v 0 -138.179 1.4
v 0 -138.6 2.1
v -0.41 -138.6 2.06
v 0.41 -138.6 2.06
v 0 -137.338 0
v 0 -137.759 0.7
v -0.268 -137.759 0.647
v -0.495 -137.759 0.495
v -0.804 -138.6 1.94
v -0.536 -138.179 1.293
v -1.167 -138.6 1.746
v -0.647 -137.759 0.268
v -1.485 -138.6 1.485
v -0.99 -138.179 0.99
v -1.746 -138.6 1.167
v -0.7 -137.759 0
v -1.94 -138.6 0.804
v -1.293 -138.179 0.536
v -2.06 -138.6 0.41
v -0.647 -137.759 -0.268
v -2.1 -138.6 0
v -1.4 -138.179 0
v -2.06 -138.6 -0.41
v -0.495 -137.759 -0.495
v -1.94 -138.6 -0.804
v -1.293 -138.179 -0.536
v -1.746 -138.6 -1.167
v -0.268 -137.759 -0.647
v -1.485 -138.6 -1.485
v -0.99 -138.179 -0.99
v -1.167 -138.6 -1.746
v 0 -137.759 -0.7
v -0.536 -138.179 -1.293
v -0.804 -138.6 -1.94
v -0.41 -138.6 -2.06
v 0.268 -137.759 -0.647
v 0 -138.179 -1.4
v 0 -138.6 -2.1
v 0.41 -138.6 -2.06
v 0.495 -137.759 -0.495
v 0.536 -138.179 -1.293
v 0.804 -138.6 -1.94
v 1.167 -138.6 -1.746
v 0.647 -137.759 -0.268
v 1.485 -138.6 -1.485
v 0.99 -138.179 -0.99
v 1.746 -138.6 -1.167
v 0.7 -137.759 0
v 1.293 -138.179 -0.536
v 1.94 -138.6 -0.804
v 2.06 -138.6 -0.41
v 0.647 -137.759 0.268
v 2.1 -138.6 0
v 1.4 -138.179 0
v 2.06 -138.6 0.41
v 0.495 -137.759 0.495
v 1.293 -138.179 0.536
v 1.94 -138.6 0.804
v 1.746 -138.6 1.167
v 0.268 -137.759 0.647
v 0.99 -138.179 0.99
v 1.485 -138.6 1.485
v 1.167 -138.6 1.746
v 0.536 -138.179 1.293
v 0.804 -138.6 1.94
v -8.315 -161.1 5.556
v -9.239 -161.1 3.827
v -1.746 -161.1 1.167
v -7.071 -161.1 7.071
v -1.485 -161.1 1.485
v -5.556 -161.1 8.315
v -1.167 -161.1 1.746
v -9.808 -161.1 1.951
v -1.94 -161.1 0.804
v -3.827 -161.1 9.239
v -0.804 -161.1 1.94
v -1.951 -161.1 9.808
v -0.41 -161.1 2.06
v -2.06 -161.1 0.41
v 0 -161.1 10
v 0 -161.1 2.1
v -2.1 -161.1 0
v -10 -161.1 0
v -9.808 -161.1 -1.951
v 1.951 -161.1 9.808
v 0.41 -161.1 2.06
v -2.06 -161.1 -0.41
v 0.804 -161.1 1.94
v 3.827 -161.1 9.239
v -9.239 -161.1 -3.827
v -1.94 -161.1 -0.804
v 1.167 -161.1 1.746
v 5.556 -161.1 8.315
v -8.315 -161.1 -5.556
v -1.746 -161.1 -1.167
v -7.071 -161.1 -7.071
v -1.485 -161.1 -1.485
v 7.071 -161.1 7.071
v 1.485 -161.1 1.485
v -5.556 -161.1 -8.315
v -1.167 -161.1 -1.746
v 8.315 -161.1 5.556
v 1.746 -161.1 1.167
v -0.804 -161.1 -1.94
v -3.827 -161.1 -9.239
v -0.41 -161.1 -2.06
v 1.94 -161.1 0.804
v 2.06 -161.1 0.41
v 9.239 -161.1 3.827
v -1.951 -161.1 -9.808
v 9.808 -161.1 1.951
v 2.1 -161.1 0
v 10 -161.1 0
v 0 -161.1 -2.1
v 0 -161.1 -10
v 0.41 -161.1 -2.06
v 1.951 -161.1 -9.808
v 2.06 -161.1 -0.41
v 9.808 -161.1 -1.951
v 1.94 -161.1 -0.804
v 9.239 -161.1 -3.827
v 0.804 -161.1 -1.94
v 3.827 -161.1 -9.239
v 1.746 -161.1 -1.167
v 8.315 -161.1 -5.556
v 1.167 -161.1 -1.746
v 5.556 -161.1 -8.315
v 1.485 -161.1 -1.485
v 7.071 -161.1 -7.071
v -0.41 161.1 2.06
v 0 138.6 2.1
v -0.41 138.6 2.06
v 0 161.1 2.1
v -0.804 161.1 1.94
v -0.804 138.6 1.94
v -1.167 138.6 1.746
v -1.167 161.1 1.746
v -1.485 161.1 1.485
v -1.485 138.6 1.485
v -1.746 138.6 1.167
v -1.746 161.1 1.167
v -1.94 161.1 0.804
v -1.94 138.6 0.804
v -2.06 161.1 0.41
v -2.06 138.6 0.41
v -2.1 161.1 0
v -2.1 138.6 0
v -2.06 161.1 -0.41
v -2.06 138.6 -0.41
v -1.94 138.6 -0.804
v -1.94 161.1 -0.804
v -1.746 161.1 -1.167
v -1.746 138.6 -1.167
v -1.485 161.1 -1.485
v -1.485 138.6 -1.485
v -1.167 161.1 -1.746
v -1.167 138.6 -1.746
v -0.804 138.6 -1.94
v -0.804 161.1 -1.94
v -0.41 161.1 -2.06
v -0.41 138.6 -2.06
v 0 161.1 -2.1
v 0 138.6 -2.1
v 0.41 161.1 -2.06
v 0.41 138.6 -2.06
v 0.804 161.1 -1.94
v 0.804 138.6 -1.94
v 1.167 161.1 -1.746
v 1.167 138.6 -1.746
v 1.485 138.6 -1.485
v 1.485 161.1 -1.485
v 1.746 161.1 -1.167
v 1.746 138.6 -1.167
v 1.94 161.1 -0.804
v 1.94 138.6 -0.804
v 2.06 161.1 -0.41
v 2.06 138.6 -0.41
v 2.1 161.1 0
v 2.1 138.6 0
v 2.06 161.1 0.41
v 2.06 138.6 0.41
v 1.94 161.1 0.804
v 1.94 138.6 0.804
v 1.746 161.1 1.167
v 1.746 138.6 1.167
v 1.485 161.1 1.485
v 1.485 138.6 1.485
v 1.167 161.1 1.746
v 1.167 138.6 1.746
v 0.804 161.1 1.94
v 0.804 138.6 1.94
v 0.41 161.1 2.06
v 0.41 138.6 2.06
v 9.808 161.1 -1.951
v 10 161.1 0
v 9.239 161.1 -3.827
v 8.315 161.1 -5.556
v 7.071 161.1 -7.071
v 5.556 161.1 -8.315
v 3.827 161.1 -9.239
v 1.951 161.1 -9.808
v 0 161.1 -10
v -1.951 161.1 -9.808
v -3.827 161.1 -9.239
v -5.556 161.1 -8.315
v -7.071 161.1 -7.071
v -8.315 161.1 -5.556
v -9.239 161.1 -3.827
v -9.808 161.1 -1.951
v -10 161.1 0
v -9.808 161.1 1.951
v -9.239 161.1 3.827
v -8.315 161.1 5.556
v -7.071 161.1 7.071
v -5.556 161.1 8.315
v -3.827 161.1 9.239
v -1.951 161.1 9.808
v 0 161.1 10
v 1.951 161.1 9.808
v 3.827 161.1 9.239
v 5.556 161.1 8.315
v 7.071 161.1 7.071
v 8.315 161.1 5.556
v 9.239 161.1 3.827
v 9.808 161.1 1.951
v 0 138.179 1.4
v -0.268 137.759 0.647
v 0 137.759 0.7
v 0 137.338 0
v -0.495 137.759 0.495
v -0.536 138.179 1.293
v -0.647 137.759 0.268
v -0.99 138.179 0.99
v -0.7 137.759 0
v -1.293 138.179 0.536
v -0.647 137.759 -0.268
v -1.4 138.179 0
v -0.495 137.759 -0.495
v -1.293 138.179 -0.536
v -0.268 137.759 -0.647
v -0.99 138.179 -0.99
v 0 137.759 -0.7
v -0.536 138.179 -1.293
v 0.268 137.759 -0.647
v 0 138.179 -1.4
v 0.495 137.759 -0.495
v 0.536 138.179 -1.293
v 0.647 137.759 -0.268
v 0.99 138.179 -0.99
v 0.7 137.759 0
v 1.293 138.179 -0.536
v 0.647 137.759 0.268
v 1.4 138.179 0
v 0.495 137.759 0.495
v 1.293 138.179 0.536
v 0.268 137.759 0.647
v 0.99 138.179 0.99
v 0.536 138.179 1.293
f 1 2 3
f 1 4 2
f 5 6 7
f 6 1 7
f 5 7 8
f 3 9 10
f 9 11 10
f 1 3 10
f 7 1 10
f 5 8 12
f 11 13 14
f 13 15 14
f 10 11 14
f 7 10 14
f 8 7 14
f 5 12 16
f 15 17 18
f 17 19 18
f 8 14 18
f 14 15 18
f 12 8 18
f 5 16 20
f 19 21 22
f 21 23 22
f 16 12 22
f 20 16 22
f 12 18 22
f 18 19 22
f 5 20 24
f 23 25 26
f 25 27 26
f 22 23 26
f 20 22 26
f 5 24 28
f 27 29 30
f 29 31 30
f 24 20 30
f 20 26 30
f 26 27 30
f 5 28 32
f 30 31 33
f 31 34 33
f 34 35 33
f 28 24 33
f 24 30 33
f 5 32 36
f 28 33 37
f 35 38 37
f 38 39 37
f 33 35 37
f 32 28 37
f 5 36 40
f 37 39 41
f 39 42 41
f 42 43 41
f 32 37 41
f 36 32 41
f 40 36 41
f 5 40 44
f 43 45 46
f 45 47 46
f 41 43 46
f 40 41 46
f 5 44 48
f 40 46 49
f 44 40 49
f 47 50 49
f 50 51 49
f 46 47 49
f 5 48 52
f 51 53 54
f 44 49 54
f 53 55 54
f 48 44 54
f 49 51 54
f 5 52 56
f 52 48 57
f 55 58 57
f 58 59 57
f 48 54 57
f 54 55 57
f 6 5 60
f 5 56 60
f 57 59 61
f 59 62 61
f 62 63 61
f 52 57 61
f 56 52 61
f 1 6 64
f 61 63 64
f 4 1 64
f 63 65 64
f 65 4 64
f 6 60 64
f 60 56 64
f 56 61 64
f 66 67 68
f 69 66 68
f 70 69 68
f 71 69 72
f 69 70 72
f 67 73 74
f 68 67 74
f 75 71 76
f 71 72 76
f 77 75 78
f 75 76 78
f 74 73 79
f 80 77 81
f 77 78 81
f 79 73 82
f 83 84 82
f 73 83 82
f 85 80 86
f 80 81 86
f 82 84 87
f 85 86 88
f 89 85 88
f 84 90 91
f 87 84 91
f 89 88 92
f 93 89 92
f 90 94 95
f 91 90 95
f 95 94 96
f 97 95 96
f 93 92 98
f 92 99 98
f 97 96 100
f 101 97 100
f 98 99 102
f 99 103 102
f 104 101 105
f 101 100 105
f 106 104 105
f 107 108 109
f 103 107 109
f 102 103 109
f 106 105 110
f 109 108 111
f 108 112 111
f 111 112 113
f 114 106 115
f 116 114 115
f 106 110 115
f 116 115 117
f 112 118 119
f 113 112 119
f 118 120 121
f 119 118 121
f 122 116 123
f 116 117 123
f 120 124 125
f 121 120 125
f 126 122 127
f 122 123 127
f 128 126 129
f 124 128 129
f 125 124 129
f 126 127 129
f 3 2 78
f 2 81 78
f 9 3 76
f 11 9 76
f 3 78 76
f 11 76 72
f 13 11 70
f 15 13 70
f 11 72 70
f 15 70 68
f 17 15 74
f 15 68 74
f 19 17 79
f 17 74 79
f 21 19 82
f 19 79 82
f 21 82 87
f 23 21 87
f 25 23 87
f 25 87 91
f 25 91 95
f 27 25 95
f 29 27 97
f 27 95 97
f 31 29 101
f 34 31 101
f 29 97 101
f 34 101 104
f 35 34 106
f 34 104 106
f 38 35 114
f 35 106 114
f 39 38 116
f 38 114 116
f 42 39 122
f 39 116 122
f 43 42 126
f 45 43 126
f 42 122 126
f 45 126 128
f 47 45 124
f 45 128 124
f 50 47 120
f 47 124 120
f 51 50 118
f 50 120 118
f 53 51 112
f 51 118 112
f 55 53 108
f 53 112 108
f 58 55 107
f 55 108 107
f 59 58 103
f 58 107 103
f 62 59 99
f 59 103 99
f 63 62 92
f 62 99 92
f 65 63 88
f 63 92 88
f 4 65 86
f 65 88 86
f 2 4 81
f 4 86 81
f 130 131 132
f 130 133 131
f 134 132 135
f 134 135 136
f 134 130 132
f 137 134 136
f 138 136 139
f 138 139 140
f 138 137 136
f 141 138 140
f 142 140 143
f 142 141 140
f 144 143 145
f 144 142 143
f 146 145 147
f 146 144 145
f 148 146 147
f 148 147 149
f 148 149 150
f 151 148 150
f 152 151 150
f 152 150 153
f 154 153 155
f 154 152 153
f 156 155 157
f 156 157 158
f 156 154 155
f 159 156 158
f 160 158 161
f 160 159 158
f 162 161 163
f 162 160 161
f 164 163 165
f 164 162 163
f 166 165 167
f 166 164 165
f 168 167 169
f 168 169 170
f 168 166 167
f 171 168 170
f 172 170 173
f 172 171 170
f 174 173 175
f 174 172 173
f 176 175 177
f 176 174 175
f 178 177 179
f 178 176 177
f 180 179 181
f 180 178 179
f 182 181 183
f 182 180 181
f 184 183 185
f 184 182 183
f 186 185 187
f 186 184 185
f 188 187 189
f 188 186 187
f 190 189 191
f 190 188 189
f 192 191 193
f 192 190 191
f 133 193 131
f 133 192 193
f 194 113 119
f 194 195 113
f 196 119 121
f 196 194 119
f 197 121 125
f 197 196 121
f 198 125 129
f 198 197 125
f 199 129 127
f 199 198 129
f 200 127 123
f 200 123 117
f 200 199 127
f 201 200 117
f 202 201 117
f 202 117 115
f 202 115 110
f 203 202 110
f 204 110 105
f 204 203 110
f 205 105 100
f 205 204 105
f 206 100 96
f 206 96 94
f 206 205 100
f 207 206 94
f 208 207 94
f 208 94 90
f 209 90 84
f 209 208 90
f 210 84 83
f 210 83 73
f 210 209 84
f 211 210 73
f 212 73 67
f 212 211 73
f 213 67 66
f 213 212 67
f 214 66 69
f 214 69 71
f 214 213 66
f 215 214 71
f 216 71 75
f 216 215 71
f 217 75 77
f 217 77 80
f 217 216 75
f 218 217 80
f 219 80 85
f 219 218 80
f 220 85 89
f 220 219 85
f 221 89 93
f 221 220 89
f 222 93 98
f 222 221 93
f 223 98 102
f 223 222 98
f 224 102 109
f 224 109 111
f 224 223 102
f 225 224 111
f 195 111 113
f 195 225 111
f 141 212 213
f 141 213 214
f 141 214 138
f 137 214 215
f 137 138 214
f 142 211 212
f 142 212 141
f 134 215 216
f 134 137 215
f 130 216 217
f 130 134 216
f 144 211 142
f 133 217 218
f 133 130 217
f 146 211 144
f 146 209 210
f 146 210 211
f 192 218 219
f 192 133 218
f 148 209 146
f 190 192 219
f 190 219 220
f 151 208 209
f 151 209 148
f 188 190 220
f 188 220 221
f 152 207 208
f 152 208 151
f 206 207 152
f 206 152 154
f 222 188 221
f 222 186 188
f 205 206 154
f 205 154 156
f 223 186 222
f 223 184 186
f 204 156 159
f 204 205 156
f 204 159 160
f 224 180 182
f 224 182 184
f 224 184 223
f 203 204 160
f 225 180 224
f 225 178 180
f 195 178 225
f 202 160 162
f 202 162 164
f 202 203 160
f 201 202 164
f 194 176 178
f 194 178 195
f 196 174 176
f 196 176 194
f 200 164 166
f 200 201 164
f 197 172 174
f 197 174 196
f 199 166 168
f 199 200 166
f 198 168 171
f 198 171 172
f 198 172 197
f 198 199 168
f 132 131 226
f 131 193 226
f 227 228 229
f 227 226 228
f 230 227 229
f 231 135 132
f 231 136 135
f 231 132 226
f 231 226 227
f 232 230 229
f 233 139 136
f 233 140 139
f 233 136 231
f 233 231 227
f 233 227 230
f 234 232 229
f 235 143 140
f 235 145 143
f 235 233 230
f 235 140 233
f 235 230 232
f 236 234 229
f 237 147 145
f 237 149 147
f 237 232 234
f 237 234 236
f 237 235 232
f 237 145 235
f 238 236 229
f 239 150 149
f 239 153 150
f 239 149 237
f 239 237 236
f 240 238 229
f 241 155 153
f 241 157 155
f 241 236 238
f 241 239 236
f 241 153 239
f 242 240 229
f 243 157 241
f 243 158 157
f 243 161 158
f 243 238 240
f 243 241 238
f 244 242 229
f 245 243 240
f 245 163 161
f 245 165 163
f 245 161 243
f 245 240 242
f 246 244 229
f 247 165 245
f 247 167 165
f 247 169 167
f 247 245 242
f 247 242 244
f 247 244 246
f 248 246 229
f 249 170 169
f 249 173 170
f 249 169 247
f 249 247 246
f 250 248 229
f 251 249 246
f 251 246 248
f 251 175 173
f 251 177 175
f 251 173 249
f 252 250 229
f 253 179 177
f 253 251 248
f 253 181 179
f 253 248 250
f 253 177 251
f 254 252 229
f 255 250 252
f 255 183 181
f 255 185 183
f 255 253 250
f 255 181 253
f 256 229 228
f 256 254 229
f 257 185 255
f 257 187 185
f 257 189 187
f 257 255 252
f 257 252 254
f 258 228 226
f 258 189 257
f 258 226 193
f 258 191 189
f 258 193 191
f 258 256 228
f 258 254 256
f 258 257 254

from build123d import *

# Parameters (mm, degrees)
SKETCH1_R           = 10
BOSS_EXTRUDE1_DEPTH = 161.1


with BuildPart() as part:
    # Sketch1 → Boss-Extrude1 (new body, symmetric)
    with BuildSketch(Plane(origin=(0, 0, 0), x_dir=(1, 0, 0), z_dir=(0, 1, 0))):
        Circle(SKETCH1_R)
    extrude(amount=BOSS_EXTRUDE1_DEPTH, both=True)

    # Sketch3 → M5x0.8 Tapped Hole1 (revolve, cut)
    with BuildSketch(Plane(origin=(0, 161.1, 0), x_dir=(0, 0, 1), z_dir=(1, 0, 0))):
        Polygon((0, 0), (0, 23.7618073), (2.1, 22.5), (2.1, 0), align=None)
    m5x0_8_tapped_hole1 = revolve(axis=Axis((0, 167.45, 0), (0, -1, 0)), mode=Mode.SUBTRACT)

    # Mirror1: M5x0.8 Tapped Hole1 across plane
    add(m5x0_8_tapped_hole1.mirror(Plane.ZX), mode=Mode.SUBTRACT)


solid = part.part
